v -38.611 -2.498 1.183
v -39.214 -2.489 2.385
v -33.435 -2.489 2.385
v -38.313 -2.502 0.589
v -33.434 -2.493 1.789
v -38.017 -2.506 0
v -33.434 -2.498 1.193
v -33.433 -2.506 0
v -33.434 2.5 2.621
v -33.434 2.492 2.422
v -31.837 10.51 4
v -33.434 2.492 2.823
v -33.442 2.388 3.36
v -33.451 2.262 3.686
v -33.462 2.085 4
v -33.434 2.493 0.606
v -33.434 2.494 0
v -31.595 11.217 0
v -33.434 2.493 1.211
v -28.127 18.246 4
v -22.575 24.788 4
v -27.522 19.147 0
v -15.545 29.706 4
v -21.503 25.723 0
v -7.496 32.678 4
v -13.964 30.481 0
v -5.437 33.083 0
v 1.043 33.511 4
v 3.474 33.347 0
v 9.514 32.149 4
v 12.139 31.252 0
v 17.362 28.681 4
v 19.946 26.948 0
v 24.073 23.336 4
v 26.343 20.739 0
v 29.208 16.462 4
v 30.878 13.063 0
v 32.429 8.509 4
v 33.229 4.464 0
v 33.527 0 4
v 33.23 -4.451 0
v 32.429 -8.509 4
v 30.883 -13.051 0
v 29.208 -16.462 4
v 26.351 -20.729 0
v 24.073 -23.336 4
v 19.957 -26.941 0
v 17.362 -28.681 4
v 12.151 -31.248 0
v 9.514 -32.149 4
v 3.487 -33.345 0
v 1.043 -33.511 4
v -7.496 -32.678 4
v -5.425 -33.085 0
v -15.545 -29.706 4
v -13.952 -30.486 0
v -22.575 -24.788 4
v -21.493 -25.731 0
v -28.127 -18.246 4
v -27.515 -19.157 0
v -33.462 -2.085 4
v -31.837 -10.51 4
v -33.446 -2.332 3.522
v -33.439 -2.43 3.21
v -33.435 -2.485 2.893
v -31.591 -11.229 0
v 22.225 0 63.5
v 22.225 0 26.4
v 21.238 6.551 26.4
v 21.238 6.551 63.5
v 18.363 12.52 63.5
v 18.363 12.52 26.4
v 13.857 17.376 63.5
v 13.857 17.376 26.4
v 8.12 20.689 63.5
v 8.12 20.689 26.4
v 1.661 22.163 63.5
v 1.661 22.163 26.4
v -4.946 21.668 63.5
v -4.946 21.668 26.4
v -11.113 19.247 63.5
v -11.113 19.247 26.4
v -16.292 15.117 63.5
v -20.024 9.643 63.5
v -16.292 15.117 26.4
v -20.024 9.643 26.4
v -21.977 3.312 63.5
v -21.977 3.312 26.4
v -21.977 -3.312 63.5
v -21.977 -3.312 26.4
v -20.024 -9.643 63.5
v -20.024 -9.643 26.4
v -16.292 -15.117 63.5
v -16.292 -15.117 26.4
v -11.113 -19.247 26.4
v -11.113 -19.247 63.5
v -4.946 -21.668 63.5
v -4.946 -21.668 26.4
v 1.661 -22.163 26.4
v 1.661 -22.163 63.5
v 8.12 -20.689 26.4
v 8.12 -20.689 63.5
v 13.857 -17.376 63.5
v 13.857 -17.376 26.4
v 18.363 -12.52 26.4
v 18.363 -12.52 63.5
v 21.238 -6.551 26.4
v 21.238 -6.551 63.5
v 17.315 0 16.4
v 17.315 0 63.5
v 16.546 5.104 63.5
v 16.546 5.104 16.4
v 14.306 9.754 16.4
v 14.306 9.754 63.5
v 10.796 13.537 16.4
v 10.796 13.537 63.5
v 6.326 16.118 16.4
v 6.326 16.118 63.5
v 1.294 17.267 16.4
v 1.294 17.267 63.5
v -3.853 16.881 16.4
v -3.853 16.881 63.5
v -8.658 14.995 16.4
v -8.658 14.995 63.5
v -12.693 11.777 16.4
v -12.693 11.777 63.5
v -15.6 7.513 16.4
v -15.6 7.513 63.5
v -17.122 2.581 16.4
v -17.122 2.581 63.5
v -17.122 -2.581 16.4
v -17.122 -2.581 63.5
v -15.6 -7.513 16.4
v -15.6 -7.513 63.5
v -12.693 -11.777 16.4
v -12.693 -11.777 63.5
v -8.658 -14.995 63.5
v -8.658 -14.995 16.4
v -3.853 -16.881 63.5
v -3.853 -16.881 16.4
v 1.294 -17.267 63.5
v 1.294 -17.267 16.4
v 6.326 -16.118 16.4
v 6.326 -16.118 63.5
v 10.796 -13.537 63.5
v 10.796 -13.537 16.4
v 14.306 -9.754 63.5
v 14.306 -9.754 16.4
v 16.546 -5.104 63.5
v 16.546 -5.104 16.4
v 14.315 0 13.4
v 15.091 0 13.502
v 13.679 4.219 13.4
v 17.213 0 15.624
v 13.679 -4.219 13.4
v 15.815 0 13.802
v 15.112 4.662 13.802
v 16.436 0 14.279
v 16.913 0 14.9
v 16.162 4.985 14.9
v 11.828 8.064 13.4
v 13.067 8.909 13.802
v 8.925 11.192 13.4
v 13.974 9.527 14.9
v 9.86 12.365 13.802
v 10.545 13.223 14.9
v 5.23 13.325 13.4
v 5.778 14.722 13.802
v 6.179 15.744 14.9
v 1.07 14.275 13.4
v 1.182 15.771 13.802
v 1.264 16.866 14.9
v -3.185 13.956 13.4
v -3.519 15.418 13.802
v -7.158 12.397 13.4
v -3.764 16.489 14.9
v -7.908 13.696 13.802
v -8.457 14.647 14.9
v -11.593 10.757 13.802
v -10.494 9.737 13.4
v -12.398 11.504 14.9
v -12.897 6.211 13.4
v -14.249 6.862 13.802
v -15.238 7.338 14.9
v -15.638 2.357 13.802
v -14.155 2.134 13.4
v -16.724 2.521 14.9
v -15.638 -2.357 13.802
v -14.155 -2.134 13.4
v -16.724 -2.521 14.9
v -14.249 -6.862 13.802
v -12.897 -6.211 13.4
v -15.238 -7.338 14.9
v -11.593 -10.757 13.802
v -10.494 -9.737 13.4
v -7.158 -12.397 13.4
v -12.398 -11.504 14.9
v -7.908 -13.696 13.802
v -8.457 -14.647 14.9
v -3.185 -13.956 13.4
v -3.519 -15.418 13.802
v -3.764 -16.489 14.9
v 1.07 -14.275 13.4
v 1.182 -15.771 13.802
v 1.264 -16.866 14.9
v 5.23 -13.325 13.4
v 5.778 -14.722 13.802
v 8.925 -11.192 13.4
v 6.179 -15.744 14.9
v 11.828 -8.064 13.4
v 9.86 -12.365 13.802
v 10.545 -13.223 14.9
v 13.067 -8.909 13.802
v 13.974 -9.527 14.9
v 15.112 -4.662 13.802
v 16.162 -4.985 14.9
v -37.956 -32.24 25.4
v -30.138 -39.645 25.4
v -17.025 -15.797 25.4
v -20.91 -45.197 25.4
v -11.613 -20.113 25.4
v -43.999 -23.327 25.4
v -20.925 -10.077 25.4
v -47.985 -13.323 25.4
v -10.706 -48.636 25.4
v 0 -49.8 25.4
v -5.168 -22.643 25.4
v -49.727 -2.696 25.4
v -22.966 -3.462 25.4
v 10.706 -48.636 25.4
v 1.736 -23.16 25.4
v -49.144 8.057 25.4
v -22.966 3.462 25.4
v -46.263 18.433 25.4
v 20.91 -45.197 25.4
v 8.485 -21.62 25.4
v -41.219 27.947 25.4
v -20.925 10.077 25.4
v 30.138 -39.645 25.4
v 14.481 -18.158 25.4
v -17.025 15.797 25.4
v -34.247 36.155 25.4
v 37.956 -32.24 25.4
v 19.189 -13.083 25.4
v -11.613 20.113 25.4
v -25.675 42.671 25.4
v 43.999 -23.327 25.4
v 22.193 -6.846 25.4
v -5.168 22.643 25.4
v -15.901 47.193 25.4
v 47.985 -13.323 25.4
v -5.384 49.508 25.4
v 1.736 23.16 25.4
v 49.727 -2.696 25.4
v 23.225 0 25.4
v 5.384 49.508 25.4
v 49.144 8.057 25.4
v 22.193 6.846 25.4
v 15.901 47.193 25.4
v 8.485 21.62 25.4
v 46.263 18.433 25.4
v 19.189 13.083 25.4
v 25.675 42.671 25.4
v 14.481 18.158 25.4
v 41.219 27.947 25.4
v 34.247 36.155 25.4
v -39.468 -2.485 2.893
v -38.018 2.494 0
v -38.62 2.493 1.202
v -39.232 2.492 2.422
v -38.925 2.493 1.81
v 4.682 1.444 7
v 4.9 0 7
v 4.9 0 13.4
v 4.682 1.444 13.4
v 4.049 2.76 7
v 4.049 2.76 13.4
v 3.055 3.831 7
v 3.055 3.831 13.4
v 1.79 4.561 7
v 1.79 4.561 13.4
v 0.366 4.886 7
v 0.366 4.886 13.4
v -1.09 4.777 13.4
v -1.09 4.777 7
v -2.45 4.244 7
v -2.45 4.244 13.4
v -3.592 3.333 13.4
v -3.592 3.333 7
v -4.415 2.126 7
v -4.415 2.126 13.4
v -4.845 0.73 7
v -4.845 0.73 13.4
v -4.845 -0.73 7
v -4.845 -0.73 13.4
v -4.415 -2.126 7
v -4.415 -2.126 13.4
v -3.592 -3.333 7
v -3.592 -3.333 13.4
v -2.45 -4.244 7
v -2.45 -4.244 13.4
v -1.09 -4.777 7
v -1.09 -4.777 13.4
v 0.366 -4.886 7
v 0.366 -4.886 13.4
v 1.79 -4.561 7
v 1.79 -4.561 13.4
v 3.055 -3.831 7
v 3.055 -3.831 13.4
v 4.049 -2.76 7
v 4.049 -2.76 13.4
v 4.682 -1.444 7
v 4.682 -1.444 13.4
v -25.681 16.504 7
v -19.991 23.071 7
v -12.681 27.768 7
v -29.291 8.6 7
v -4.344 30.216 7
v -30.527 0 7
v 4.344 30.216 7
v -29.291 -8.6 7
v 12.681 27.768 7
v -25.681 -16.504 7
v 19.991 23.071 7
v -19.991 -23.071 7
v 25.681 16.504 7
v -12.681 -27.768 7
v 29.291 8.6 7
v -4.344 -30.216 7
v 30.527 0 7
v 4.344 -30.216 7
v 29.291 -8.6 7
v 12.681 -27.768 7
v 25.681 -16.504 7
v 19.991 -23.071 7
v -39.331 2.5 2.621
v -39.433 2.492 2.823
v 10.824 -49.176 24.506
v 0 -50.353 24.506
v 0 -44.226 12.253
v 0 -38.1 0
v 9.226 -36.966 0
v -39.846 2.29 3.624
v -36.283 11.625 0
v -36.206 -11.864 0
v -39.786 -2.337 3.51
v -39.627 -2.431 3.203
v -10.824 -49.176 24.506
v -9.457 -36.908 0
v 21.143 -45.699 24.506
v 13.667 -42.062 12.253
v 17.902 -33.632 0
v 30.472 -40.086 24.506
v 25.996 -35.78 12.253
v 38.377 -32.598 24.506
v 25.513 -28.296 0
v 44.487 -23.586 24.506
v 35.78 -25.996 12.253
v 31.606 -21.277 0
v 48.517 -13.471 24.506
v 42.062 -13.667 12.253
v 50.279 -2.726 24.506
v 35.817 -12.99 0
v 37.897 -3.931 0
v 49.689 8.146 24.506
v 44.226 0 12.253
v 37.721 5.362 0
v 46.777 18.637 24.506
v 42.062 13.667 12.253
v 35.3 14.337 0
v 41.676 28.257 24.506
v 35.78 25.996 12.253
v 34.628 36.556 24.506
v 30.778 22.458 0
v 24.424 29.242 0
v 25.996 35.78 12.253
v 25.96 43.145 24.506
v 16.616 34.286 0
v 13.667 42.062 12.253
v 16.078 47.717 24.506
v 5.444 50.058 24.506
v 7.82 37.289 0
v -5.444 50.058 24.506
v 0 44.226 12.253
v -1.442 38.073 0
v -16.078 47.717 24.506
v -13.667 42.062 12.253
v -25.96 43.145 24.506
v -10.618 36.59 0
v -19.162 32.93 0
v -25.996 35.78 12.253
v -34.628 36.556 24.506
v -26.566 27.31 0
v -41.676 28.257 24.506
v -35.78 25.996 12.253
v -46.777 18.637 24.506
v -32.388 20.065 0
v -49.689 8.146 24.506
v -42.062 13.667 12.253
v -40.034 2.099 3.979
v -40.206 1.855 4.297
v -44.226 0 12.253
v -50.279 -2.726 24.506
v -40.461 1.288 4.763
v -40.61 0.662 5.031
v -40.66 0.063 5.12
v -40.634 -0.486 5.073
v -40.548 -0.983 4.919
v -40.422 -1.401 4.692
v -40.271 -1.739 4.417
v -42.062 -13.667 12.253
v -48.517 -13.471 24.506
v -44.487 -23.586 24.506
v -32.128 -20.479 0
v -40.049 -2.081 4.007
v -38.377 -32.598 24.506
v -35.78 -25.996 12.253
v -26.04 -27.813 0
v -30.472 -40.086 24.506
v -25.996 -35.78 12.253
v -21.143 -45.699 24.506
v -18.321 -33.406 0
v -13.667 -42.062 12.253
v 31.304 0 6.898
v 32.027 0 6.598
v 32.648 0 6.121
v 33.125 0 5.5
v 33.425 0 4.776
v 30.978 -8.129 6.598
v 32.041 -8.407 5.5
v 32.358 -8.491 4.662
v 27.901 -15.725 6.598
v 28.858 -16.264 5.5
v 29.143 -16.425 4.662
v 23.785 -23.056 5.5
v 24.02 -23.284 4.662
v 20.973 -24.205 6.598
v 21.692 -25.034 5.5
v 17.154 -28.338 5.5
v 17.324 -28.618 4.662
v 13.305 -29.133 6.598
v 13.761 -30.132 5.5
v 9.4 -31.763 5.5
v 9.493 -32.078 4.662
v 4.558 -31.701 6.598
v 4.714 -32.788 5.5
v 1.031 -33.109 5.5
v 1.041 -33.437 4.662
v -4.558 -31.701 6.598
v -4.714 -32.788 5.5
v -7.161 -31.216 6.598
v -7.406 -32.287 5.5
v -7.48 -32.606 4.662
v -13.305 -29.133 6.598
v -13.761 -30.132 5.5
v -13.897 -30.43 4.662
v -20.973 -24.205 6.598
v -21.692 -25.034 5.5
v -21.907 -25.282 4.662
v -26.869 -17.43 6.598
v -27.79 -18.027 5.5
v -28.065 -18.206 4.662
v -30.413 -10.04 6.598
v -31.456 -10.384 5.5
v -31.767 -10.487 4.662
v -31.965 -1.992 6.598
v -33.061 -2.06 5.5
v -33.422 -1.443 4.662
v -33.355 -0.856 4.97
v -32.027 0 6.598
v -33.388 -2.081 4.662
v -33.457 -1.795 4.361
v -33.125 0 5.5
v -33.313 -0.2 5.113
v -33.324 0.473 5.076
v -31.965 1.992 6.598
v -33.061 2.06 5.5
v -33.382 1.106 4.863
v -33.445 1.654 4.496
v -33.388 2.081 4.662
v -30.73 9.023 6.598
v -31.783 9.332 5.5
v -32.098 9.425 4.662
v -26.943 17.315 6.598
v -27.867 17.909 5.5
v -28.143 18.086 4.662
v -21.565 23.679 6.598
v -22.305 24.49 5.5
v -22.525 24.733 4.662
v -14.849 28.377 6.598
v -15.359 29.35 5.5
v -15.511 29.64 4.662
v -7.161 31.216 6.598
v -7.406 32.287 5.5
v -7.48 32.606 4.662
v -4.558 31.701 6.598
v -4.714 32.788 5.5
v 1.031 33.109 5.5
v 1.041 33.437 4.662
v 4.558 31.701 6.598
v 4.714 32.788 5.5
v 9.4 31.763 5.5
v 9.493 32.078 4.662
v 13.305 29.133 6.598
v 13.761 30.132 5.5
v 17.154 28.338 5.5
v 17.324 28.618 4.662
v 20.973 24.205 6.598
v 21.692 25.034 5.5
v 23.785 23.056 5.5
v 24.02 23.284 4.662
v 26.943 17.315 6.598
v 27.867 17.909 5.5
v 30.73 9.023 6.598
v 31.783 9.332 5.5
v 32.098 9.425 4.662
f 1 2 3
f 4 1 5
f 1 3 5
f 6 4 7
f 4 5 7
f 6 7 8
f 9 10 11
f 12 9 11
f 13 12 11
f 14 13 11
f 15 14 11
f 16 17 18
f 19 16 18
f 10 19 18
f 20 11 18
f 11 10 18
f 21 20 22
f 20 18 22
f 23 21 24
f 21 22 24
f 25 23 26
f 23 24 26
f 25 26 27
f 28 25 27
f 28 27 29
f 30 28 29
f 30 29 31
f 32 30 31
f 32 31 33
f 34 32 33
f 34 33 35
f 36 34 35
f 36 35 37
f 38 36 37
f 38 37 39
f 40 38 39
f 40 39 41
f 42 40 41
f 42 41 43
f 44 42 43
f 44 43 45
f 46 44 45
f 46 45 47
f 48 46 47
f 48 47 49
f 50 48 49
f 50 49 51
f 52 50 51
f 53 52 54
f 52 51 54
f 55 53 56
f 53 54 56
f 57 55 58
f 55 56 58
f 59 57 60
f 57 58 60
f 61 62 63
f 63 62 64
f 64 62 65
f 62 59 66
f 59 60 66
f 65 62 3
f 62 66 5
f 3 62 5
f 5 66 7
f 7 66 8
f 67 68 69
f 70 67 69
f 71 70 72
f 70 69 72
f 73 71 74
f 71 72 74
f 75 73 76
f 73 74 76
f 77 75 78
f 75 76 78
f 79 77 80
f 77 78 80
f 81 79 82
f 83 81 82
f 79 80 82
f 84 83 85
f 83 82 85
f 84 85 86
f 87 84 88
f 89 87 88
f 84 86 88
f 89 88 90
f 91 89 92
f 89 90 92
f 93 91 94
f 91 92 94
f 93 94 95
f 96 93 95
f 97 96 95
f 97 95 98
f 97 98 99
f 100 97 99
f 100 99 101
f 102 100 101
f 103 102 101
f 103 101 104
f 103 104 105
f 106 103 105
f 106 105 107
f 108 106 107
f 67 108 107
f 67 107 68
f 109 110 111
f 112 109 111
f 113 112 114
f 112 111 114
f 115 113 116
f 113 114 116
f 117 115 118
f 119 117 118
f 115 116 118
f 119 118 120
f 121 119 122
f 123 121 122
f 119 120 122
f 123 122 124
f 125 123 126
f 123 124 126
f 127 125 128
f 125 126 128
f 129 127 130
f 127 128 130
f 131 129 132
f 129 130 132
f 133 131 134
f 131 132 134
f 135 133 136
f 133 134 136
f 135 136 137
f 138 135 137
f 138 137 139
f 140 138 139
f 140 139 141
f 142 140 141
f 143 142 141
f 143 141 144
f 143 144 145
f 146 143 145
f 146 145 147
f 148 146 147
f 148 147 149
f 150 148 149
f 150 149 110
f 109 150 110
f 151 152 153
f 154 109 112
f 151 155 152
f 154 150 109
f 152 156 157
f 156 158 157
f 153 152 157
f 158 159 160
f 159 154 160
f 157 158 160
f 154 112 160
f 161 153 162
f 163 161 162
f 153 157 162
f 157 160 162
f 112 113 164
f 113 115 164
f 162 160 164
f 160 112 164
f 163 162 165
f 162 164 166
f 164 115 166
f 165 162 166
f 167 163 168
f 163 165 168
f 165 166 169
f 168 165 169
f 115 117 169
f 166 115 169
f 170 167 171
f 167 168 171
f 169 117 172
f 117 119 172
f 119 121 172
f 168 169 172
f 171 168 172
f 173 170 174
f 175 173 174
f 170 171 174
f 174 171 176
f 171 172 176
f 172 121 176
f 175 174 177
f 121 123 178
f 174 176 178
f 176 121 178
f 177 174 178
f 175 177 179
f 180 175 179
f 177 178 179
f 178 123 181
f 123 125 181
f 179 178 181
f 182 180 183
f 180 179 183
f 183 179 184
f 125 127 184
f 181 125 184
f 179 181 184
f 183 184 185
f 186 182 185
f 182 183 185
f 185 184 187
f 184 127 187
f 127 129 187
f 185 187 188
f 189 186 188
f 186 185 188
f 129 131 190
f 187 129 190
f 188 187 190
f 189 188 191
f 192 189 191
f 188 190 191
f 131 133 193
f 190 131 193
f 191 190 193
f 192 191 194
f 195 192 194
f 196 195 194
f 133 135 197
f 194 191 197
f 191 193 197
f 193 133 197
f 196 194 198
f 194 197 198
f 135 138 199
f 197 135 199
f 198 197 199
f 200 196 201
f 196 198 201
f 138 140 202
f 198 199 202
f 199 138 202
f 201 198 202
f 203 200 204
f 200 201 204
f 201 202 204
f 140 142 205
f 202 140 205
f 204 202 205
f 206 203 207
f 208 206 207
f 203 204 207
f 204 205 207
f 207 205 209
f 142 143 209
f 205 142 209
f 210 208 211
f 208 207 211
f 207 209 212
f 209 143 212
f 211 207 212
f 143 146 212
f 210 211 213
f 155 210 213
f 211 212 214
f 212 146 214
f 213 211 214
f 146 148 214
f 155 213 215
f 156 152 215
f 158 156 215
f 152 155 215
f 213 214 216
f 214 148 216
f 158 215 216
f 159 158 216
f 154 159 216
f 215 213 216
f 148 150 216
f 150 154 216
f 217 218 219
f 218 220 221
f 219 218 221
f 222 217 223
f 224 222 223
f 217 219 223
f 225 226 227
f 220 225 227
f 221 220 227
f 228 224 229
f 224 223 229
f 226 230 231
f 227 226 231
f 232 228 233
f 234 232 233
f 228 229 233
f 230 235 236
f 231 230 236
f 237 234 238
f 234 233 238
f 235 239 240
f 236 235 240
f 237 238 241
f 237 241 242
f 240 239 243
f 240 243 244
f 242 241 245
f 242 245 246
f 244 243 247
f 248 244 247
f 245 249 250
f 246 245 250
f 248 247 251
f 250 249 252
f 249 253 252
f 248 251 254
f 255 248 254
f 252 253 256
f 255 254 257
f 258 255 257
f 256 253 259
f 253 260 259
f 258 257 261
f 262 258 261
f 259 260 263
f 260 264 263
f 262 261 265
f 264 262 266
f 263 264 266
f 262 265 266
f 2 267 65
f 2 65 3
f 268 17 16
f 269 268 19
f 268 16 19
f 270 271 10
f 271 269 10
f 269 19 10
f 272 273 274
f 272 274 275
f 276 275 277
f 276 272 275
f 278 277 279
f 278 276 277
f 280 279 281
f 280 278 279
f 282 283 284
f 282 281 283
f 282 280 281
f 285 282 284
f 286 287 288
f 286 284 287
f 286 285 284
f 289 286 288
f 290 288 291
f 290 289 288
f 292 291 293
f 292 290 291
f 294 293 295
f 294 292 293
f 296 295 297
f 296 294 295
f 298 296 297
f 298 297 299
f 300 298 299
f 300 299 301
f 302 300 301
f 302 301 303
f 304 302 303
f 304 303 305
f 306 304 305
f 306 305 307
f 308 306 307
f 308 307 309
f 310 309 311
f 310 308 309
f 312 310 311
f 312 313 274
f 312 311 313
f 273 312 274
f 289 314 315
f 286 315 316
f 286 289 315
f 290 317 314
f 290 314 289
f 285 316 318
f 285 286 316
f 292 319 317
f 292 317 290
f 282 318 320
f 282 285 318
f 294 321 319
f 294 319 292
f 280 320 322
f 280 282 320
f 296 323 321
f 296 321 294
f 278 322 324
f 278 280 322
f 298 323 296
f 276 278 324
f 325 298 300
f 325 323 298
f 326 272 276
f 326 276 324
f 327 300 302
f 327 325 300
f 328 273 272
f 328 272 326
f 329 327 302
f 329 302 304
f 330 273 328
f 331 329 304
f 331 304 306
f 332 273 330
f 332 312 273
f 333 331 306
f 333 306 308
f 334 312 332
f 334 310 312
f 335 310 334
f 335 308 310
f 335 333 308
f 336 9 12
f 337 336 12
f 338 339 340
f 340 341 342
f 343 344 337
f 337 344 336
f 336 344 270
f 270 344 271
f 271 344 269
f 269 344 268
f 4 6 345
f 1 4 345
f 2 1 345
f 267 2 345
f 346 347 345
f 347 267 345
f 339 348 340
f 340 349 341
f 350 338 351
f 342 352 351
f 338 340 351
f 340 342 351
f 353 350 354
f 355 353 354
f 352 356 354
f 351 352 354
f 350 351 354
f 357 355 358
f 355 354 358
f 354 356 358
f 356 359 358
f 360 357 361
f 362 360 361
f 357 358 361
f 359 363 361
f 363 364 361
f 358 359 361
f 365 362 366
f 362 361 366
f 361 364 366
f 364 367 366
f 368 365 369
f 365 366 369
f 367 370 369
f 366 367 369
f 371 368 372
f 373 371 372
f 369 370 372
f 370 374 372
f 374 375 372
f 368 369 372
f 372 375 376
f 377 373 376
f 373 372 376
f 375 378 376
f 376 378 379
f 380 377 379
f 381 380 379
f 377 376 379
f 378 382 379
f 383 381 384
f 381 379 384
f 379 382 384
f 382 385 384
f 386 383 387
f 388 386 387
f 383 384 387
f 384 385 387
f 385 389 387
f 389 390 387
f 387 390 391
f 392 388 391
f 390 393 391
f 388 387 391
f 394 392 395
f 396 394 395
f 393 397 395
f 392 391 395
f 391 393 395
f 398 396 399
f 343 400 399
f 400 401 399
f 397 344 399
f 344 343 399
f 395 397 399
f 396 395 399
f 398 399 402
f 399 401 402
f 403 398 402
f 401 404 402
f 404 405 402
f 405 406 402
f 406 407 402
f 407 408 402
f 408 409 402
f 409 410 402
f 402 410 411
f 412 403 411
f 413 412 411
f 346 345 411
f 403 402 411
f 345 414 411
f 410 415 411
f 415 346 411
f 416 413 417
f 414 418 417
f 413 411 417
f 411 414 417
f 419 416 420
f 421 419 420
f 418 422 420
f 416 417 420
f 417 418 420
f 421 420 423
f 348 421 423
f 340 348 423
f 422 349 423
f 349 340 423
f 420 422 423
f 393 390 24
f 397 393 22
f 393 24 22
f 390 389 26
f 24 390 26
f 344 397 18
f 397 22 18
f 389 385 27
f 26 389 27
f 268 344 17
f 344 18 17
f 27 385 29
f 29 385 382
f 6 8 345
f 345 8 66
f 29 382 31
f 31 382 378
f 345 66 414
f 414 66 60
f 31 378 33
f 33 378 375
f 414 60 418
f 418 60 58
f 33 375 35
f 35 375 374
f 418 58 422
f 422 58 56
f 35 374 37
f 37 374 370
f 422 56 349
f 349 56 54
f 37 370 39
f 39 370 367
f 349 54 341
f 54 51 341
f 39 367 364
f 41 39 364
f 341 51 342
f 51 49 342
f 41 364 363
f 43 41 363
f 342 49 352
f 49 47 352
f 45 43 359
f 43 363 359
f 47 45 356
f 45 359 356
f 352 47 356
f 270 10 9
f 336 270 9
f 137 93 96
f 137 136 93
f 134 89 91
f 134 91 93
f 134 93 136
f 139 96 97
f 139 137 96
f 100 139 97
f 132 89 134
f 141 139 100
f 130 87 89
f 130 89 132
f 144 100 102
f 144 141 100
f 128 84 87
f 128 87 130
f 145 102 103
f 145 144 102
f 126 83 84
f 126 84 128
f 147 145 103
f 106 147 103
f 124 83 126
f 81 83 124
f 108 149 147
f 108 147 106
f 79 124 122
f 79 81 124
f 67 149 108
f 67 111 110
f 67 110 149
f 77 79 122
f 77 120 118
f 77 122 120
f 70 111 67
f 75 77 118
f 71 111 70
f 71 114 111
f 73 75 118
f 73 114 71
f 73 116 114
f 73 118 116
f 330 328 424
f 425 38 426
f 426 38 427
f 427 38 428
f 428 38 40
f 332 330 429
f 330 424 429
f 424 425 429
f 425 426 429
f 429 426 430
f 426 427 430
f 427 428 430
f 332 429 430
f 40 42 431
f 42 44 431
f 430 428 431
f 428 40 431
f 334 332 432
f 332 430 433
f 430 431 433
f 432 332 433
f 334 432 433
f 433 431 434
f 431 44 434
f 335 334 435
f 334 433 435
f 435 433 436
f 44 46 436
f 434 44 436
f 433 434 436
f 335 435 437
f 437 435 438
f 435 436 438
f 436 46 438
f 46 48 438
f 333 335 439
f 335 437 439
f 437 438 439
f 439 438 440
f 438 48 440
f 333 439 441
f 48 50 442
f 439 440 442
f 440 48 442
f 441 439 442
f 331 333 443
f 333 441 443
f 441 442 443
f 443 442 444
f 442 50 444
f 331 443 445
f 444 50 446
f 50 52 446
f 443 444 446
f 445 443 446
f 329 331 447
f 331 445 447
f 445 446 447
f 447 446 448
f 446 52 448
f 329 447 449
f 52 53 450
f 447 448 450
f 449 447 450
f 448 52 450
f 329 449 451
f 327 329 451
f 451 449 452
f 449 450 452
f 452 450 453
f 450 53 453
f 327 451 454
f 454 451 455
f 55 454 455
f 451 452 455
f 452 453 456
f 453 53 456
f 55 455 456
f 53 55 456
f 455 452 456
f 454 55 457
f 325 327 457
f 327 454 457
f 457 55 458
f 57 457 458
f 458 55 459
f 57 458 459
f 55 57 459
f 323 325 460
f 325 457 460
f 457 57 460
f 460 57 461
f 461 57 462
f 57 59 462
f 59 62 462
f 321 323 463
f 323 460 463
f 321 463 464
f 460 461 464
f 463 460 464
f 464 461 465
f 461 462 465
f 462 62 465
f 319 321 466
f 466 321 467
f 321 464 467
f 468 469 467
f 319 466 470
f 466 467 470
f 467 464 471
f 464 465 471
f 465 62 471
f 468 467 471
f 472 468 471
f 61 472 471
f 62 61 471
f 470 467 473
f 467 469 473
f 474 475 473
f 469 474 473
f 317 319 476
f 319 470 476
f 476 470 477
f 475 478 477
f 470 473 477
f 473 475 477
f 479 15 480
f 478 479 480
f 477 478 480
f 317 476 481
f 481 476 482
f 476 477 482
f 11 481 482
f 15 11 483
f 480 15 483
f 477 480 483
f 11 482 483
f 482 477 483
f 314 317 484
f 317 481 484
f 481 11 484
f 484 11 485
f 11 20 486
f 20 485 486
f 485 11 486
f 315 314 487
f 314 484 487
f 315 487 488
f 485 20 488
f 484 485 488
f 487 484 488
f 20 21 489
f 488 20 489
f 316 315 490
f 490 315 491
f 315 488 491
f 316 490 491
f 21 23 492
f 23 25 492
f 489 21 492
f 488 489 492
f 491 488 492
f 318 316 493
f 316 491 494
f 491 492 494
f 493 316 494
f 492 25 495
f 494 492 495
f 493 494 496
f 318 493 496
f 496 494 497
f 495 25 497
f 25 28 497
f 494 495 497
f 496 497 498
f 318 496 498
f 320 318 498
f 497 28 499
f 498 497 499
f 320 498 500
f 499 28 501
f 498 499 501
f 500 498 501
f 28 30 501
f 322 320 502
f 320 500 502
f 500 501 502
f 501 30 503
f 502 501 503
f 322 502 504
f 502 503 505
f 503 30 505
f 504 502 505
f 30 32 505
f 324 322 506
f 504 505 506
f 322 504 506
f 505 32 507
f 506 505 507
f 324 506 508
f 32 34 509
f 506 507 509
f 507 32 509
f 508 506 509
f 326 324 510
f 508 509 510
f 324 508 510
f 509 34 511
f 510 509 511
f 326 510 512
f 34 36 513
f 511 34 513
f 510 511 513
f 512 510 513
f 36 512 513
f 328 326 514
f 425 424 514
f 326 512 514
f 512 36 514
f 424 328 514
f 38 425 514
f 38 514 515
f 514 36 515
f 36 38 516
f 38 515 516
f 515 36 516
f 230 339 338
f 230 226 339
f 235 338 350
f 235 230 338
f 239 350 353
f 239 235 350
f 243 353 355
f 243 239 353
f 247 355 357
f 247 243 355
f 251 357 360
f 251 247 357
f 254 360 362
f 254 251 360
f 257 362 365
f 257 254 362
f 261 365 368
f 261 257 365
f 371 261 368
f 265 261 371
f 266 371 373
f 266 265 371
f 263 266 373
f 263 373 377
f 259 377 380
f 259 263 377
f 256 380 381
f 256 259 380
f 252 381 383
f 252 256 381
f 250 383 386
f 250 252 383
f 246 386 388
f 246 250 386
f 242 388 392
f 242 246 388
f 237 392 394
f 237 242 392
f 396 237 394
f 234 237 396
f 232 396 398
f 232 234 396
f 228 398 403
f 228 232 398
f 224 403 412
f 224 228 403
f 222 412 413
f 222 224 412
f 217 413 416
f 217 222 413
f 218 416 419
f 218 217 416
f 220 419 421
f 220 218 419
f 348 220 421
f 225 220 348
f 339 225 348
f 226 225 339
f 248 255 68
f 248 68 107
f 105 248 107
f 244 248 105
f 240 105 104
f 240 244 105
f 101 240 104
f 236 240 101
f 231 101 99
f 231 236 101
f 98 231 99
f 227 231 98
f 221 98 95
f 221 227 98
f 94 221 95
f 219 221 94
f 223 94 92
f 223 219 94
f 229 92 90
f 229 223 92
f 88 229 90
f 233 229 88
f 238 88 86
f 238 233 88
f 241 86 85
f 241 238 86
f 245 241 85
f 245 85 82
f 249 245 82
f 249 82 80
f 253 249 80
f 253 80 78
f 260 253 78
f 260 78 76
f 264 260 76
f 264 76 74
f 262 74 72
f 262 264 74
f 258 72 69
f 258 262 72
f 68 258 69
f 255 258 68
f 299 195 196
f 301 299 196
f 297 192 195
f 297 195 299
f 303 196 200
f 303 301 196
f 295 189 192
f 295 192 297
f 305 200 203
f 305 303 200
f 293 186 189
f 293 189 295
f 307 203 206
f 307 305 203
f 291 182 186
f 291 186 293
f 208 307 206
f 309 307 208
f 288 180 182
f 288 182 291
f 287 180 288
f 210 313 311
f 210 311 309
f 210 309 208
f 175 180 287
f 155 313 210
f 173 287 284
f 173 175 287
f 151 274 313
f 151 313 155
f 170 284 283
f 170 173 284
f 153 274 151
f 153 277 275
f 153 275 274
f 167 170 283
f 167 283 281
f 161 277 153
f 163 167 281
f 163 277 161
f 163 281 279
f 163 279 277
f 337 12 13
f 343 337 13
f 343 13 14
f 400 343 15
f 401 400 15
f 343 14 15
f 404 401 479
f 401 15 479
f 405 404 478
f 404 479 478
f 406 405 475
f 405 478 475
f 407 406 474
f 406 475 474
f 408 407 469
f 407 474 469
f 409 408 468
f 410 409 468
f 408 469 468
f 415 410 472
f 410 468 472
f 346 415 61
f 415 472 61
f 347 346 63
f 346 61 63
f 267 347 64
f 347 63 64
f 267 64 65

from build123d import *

# Parameters (mm, degrees)
F0_R          = 22.225
F0_R_2        = 17.315
F1_DEPTH      = 63.5
F4_SIZE       = 1
F5_R          = 4.9
F3_FACE_R     = 49.8
F3_FACE_R_2   = 22.225
F6_DEPTH      = 40
F7_DEPTH      = 63.501
F7_DEPTH_BACK = 30
F8_R          = 17.315
F9_DEPTH      = 12
F10_R         = 3
F11_R         = 33.5271440313
F12_DEPTH     = 7
F13_R         = 3
F14_W         = 5
F14_H         = 4.8698585015
F15_DEPTH     = 50.3537864045
F16_SIZE      = 1


# Not quite as in the source:
# - a feature names something its author has since deleted; it is built from what else it names


with BuildPart() as f1:
    # F0 (on Top) → F1 (new body)
    with BuildSketch(Plane.XY):
        Circle(F0_R)
        Circle(F0_R_2, mode=Mode.SUBTRACT)
    extrude(amount=F1_DEPTH)

    # F2 (on Right) → F3 (revolve)
    with BuildSketch(Plane.YZ):
        Polygon((-38.1, 0), (0, 0), (0, 25.4), (-17.315, 25.4), (-50.8, 25.4), align=None)
    revolve(axis=Axis((0, 0, 12.7), (0, 0, 1)))

    # F4
    f4_edges = [f1.edges().sort_by_distance(p)[0] for p in [
        (0, 50.8, 25.4),
    ]]
    chamfer(f4_edges, length=F4_SIZE)

    # F5 (on Top) + F3_face (on face) → F6 (cut)
    with BuildSketch(Plane.XY):
        Circle(F5_R)
    with BuildSketch(Plane.XY.offset(25.4)):
        Circle(F3_FACE_R)
        Circle(F3_FACE_R_2, mode=Mode.SUBTRACT)
    extrude(amount=F6_DEPTH, mode=Mode.SUBTRACT)

    # F5 (on Top) → F7 (cut, two sides)
    with BuildSketch(Plane.XY) as f7_sk:
        Circle(F5_R)
    extrude(amount=F7_DEPTH, mode=Mode.SUBTRACT)
    extrude(f7_sk.sketch, amount=-F7_DEPTH_BACK, mode=Mode.SUBTRACT)

    # F8 (on face) → F9 (cut)
    with BuildSketch(Plane.XY.offset(25.4)):
        Circle(F8_R)
    extrude(amount=-F9_DEPTH, mode=Mode.SUBTRACT)

    # F10
    f10_edges = [f1.edges().sort_by_distance(p)[0] for p in [
        (-17.315, 0, 13.4),
    ]]
    fillet(f10_edges, radius=F10_R)

    # F11 (on face) → F12 (cut)
    with BuildSketch(Plane(origin=(0, 0, 0), x_dir=(1, 0, 0), z_dir=(0, 0, -1))):
        Circle(F11_R)
    extrude(amount=-F12_DEPTH, mode=Mode.SUBTRACT)

    # F13
    f13_edges = [f1.edges().sort_by_distance(p)[0] for p in [
        (-33.527144, 0, 7),
    ]]
    fillet(f13_edges, radius=F13_R)

    # F14 (on Right) → F15 (cut, through all)
    with BuildSketch(Plane.YZ):
        with BuildLine():
            Line((-2.4888959483, 2.3854229395), (-2.5063311768, 0))
            Line((-2.5063311768, 0), (2.4936688232, 0))
            Line((2.4936688232, 0), (2.4921056953, 2.4222710093))
            ThreePointArc((2.4921056953, 2.4222710093), (0.0184938011, 0.120856929), (-2.4888959483, 2.3854229395))
        make_face()
        with Locations((-0.0063311768, -2.4349292507)):
            Rectangle(F14_W, F14_H)
        with BuildLine():
            Line((-2.485189612, 2.8925100588), (-2.4888959483, 2.3854229395))
            ThreePointArc((-2.4888959483, 2.3854229395), (0.0184938011, 0.120856929), (2.4921056953, 2.4222710093))
            Line((2.4921056953, 2.4222710093), (2.4918474071, 2.8225222584))
            ThreePointArc((2.4918474071, 2.8225222584), (0.0351518792, 5.1205413808), (-2.485189612, 2.8925100588))
        make_face()
        with BuildLine():
            ThreePointArc((-2.485189612, 2.8925100588), (-2.4999332245, 2.6390607164), (-2.4888959483, 2.3854229395))
            Line((-2.4888959483, 2.3854229395), (-2.485189612, 2.8925100588))
        make_face()
        with BuildLine():
            Line((2.4918474071, 2.8225222584), (2.4921056953, 2.4222710093))
            ThreePointArc((2.4921056953, 2.4222710093), (2.4980256442, 2.5214513158), (2.5, 2.6207885239))
            ThreePointArc((2.5, 2.6207885239), (2.4979610203, 2.7217377245), (2.4918474071, 2.8225222584))
        make_face()
    extrude(amount=-F15_DEPTH, mode=Mode.SUBTRACT)

    # F16
    f16_edges = [f1.edges().sort_by_distance(p)[0] for p in [
        (-22.225, 0, 25.4),
    ]]
    chamfer(f16_edges, length=F16_SIZE)


solid = f1.part
